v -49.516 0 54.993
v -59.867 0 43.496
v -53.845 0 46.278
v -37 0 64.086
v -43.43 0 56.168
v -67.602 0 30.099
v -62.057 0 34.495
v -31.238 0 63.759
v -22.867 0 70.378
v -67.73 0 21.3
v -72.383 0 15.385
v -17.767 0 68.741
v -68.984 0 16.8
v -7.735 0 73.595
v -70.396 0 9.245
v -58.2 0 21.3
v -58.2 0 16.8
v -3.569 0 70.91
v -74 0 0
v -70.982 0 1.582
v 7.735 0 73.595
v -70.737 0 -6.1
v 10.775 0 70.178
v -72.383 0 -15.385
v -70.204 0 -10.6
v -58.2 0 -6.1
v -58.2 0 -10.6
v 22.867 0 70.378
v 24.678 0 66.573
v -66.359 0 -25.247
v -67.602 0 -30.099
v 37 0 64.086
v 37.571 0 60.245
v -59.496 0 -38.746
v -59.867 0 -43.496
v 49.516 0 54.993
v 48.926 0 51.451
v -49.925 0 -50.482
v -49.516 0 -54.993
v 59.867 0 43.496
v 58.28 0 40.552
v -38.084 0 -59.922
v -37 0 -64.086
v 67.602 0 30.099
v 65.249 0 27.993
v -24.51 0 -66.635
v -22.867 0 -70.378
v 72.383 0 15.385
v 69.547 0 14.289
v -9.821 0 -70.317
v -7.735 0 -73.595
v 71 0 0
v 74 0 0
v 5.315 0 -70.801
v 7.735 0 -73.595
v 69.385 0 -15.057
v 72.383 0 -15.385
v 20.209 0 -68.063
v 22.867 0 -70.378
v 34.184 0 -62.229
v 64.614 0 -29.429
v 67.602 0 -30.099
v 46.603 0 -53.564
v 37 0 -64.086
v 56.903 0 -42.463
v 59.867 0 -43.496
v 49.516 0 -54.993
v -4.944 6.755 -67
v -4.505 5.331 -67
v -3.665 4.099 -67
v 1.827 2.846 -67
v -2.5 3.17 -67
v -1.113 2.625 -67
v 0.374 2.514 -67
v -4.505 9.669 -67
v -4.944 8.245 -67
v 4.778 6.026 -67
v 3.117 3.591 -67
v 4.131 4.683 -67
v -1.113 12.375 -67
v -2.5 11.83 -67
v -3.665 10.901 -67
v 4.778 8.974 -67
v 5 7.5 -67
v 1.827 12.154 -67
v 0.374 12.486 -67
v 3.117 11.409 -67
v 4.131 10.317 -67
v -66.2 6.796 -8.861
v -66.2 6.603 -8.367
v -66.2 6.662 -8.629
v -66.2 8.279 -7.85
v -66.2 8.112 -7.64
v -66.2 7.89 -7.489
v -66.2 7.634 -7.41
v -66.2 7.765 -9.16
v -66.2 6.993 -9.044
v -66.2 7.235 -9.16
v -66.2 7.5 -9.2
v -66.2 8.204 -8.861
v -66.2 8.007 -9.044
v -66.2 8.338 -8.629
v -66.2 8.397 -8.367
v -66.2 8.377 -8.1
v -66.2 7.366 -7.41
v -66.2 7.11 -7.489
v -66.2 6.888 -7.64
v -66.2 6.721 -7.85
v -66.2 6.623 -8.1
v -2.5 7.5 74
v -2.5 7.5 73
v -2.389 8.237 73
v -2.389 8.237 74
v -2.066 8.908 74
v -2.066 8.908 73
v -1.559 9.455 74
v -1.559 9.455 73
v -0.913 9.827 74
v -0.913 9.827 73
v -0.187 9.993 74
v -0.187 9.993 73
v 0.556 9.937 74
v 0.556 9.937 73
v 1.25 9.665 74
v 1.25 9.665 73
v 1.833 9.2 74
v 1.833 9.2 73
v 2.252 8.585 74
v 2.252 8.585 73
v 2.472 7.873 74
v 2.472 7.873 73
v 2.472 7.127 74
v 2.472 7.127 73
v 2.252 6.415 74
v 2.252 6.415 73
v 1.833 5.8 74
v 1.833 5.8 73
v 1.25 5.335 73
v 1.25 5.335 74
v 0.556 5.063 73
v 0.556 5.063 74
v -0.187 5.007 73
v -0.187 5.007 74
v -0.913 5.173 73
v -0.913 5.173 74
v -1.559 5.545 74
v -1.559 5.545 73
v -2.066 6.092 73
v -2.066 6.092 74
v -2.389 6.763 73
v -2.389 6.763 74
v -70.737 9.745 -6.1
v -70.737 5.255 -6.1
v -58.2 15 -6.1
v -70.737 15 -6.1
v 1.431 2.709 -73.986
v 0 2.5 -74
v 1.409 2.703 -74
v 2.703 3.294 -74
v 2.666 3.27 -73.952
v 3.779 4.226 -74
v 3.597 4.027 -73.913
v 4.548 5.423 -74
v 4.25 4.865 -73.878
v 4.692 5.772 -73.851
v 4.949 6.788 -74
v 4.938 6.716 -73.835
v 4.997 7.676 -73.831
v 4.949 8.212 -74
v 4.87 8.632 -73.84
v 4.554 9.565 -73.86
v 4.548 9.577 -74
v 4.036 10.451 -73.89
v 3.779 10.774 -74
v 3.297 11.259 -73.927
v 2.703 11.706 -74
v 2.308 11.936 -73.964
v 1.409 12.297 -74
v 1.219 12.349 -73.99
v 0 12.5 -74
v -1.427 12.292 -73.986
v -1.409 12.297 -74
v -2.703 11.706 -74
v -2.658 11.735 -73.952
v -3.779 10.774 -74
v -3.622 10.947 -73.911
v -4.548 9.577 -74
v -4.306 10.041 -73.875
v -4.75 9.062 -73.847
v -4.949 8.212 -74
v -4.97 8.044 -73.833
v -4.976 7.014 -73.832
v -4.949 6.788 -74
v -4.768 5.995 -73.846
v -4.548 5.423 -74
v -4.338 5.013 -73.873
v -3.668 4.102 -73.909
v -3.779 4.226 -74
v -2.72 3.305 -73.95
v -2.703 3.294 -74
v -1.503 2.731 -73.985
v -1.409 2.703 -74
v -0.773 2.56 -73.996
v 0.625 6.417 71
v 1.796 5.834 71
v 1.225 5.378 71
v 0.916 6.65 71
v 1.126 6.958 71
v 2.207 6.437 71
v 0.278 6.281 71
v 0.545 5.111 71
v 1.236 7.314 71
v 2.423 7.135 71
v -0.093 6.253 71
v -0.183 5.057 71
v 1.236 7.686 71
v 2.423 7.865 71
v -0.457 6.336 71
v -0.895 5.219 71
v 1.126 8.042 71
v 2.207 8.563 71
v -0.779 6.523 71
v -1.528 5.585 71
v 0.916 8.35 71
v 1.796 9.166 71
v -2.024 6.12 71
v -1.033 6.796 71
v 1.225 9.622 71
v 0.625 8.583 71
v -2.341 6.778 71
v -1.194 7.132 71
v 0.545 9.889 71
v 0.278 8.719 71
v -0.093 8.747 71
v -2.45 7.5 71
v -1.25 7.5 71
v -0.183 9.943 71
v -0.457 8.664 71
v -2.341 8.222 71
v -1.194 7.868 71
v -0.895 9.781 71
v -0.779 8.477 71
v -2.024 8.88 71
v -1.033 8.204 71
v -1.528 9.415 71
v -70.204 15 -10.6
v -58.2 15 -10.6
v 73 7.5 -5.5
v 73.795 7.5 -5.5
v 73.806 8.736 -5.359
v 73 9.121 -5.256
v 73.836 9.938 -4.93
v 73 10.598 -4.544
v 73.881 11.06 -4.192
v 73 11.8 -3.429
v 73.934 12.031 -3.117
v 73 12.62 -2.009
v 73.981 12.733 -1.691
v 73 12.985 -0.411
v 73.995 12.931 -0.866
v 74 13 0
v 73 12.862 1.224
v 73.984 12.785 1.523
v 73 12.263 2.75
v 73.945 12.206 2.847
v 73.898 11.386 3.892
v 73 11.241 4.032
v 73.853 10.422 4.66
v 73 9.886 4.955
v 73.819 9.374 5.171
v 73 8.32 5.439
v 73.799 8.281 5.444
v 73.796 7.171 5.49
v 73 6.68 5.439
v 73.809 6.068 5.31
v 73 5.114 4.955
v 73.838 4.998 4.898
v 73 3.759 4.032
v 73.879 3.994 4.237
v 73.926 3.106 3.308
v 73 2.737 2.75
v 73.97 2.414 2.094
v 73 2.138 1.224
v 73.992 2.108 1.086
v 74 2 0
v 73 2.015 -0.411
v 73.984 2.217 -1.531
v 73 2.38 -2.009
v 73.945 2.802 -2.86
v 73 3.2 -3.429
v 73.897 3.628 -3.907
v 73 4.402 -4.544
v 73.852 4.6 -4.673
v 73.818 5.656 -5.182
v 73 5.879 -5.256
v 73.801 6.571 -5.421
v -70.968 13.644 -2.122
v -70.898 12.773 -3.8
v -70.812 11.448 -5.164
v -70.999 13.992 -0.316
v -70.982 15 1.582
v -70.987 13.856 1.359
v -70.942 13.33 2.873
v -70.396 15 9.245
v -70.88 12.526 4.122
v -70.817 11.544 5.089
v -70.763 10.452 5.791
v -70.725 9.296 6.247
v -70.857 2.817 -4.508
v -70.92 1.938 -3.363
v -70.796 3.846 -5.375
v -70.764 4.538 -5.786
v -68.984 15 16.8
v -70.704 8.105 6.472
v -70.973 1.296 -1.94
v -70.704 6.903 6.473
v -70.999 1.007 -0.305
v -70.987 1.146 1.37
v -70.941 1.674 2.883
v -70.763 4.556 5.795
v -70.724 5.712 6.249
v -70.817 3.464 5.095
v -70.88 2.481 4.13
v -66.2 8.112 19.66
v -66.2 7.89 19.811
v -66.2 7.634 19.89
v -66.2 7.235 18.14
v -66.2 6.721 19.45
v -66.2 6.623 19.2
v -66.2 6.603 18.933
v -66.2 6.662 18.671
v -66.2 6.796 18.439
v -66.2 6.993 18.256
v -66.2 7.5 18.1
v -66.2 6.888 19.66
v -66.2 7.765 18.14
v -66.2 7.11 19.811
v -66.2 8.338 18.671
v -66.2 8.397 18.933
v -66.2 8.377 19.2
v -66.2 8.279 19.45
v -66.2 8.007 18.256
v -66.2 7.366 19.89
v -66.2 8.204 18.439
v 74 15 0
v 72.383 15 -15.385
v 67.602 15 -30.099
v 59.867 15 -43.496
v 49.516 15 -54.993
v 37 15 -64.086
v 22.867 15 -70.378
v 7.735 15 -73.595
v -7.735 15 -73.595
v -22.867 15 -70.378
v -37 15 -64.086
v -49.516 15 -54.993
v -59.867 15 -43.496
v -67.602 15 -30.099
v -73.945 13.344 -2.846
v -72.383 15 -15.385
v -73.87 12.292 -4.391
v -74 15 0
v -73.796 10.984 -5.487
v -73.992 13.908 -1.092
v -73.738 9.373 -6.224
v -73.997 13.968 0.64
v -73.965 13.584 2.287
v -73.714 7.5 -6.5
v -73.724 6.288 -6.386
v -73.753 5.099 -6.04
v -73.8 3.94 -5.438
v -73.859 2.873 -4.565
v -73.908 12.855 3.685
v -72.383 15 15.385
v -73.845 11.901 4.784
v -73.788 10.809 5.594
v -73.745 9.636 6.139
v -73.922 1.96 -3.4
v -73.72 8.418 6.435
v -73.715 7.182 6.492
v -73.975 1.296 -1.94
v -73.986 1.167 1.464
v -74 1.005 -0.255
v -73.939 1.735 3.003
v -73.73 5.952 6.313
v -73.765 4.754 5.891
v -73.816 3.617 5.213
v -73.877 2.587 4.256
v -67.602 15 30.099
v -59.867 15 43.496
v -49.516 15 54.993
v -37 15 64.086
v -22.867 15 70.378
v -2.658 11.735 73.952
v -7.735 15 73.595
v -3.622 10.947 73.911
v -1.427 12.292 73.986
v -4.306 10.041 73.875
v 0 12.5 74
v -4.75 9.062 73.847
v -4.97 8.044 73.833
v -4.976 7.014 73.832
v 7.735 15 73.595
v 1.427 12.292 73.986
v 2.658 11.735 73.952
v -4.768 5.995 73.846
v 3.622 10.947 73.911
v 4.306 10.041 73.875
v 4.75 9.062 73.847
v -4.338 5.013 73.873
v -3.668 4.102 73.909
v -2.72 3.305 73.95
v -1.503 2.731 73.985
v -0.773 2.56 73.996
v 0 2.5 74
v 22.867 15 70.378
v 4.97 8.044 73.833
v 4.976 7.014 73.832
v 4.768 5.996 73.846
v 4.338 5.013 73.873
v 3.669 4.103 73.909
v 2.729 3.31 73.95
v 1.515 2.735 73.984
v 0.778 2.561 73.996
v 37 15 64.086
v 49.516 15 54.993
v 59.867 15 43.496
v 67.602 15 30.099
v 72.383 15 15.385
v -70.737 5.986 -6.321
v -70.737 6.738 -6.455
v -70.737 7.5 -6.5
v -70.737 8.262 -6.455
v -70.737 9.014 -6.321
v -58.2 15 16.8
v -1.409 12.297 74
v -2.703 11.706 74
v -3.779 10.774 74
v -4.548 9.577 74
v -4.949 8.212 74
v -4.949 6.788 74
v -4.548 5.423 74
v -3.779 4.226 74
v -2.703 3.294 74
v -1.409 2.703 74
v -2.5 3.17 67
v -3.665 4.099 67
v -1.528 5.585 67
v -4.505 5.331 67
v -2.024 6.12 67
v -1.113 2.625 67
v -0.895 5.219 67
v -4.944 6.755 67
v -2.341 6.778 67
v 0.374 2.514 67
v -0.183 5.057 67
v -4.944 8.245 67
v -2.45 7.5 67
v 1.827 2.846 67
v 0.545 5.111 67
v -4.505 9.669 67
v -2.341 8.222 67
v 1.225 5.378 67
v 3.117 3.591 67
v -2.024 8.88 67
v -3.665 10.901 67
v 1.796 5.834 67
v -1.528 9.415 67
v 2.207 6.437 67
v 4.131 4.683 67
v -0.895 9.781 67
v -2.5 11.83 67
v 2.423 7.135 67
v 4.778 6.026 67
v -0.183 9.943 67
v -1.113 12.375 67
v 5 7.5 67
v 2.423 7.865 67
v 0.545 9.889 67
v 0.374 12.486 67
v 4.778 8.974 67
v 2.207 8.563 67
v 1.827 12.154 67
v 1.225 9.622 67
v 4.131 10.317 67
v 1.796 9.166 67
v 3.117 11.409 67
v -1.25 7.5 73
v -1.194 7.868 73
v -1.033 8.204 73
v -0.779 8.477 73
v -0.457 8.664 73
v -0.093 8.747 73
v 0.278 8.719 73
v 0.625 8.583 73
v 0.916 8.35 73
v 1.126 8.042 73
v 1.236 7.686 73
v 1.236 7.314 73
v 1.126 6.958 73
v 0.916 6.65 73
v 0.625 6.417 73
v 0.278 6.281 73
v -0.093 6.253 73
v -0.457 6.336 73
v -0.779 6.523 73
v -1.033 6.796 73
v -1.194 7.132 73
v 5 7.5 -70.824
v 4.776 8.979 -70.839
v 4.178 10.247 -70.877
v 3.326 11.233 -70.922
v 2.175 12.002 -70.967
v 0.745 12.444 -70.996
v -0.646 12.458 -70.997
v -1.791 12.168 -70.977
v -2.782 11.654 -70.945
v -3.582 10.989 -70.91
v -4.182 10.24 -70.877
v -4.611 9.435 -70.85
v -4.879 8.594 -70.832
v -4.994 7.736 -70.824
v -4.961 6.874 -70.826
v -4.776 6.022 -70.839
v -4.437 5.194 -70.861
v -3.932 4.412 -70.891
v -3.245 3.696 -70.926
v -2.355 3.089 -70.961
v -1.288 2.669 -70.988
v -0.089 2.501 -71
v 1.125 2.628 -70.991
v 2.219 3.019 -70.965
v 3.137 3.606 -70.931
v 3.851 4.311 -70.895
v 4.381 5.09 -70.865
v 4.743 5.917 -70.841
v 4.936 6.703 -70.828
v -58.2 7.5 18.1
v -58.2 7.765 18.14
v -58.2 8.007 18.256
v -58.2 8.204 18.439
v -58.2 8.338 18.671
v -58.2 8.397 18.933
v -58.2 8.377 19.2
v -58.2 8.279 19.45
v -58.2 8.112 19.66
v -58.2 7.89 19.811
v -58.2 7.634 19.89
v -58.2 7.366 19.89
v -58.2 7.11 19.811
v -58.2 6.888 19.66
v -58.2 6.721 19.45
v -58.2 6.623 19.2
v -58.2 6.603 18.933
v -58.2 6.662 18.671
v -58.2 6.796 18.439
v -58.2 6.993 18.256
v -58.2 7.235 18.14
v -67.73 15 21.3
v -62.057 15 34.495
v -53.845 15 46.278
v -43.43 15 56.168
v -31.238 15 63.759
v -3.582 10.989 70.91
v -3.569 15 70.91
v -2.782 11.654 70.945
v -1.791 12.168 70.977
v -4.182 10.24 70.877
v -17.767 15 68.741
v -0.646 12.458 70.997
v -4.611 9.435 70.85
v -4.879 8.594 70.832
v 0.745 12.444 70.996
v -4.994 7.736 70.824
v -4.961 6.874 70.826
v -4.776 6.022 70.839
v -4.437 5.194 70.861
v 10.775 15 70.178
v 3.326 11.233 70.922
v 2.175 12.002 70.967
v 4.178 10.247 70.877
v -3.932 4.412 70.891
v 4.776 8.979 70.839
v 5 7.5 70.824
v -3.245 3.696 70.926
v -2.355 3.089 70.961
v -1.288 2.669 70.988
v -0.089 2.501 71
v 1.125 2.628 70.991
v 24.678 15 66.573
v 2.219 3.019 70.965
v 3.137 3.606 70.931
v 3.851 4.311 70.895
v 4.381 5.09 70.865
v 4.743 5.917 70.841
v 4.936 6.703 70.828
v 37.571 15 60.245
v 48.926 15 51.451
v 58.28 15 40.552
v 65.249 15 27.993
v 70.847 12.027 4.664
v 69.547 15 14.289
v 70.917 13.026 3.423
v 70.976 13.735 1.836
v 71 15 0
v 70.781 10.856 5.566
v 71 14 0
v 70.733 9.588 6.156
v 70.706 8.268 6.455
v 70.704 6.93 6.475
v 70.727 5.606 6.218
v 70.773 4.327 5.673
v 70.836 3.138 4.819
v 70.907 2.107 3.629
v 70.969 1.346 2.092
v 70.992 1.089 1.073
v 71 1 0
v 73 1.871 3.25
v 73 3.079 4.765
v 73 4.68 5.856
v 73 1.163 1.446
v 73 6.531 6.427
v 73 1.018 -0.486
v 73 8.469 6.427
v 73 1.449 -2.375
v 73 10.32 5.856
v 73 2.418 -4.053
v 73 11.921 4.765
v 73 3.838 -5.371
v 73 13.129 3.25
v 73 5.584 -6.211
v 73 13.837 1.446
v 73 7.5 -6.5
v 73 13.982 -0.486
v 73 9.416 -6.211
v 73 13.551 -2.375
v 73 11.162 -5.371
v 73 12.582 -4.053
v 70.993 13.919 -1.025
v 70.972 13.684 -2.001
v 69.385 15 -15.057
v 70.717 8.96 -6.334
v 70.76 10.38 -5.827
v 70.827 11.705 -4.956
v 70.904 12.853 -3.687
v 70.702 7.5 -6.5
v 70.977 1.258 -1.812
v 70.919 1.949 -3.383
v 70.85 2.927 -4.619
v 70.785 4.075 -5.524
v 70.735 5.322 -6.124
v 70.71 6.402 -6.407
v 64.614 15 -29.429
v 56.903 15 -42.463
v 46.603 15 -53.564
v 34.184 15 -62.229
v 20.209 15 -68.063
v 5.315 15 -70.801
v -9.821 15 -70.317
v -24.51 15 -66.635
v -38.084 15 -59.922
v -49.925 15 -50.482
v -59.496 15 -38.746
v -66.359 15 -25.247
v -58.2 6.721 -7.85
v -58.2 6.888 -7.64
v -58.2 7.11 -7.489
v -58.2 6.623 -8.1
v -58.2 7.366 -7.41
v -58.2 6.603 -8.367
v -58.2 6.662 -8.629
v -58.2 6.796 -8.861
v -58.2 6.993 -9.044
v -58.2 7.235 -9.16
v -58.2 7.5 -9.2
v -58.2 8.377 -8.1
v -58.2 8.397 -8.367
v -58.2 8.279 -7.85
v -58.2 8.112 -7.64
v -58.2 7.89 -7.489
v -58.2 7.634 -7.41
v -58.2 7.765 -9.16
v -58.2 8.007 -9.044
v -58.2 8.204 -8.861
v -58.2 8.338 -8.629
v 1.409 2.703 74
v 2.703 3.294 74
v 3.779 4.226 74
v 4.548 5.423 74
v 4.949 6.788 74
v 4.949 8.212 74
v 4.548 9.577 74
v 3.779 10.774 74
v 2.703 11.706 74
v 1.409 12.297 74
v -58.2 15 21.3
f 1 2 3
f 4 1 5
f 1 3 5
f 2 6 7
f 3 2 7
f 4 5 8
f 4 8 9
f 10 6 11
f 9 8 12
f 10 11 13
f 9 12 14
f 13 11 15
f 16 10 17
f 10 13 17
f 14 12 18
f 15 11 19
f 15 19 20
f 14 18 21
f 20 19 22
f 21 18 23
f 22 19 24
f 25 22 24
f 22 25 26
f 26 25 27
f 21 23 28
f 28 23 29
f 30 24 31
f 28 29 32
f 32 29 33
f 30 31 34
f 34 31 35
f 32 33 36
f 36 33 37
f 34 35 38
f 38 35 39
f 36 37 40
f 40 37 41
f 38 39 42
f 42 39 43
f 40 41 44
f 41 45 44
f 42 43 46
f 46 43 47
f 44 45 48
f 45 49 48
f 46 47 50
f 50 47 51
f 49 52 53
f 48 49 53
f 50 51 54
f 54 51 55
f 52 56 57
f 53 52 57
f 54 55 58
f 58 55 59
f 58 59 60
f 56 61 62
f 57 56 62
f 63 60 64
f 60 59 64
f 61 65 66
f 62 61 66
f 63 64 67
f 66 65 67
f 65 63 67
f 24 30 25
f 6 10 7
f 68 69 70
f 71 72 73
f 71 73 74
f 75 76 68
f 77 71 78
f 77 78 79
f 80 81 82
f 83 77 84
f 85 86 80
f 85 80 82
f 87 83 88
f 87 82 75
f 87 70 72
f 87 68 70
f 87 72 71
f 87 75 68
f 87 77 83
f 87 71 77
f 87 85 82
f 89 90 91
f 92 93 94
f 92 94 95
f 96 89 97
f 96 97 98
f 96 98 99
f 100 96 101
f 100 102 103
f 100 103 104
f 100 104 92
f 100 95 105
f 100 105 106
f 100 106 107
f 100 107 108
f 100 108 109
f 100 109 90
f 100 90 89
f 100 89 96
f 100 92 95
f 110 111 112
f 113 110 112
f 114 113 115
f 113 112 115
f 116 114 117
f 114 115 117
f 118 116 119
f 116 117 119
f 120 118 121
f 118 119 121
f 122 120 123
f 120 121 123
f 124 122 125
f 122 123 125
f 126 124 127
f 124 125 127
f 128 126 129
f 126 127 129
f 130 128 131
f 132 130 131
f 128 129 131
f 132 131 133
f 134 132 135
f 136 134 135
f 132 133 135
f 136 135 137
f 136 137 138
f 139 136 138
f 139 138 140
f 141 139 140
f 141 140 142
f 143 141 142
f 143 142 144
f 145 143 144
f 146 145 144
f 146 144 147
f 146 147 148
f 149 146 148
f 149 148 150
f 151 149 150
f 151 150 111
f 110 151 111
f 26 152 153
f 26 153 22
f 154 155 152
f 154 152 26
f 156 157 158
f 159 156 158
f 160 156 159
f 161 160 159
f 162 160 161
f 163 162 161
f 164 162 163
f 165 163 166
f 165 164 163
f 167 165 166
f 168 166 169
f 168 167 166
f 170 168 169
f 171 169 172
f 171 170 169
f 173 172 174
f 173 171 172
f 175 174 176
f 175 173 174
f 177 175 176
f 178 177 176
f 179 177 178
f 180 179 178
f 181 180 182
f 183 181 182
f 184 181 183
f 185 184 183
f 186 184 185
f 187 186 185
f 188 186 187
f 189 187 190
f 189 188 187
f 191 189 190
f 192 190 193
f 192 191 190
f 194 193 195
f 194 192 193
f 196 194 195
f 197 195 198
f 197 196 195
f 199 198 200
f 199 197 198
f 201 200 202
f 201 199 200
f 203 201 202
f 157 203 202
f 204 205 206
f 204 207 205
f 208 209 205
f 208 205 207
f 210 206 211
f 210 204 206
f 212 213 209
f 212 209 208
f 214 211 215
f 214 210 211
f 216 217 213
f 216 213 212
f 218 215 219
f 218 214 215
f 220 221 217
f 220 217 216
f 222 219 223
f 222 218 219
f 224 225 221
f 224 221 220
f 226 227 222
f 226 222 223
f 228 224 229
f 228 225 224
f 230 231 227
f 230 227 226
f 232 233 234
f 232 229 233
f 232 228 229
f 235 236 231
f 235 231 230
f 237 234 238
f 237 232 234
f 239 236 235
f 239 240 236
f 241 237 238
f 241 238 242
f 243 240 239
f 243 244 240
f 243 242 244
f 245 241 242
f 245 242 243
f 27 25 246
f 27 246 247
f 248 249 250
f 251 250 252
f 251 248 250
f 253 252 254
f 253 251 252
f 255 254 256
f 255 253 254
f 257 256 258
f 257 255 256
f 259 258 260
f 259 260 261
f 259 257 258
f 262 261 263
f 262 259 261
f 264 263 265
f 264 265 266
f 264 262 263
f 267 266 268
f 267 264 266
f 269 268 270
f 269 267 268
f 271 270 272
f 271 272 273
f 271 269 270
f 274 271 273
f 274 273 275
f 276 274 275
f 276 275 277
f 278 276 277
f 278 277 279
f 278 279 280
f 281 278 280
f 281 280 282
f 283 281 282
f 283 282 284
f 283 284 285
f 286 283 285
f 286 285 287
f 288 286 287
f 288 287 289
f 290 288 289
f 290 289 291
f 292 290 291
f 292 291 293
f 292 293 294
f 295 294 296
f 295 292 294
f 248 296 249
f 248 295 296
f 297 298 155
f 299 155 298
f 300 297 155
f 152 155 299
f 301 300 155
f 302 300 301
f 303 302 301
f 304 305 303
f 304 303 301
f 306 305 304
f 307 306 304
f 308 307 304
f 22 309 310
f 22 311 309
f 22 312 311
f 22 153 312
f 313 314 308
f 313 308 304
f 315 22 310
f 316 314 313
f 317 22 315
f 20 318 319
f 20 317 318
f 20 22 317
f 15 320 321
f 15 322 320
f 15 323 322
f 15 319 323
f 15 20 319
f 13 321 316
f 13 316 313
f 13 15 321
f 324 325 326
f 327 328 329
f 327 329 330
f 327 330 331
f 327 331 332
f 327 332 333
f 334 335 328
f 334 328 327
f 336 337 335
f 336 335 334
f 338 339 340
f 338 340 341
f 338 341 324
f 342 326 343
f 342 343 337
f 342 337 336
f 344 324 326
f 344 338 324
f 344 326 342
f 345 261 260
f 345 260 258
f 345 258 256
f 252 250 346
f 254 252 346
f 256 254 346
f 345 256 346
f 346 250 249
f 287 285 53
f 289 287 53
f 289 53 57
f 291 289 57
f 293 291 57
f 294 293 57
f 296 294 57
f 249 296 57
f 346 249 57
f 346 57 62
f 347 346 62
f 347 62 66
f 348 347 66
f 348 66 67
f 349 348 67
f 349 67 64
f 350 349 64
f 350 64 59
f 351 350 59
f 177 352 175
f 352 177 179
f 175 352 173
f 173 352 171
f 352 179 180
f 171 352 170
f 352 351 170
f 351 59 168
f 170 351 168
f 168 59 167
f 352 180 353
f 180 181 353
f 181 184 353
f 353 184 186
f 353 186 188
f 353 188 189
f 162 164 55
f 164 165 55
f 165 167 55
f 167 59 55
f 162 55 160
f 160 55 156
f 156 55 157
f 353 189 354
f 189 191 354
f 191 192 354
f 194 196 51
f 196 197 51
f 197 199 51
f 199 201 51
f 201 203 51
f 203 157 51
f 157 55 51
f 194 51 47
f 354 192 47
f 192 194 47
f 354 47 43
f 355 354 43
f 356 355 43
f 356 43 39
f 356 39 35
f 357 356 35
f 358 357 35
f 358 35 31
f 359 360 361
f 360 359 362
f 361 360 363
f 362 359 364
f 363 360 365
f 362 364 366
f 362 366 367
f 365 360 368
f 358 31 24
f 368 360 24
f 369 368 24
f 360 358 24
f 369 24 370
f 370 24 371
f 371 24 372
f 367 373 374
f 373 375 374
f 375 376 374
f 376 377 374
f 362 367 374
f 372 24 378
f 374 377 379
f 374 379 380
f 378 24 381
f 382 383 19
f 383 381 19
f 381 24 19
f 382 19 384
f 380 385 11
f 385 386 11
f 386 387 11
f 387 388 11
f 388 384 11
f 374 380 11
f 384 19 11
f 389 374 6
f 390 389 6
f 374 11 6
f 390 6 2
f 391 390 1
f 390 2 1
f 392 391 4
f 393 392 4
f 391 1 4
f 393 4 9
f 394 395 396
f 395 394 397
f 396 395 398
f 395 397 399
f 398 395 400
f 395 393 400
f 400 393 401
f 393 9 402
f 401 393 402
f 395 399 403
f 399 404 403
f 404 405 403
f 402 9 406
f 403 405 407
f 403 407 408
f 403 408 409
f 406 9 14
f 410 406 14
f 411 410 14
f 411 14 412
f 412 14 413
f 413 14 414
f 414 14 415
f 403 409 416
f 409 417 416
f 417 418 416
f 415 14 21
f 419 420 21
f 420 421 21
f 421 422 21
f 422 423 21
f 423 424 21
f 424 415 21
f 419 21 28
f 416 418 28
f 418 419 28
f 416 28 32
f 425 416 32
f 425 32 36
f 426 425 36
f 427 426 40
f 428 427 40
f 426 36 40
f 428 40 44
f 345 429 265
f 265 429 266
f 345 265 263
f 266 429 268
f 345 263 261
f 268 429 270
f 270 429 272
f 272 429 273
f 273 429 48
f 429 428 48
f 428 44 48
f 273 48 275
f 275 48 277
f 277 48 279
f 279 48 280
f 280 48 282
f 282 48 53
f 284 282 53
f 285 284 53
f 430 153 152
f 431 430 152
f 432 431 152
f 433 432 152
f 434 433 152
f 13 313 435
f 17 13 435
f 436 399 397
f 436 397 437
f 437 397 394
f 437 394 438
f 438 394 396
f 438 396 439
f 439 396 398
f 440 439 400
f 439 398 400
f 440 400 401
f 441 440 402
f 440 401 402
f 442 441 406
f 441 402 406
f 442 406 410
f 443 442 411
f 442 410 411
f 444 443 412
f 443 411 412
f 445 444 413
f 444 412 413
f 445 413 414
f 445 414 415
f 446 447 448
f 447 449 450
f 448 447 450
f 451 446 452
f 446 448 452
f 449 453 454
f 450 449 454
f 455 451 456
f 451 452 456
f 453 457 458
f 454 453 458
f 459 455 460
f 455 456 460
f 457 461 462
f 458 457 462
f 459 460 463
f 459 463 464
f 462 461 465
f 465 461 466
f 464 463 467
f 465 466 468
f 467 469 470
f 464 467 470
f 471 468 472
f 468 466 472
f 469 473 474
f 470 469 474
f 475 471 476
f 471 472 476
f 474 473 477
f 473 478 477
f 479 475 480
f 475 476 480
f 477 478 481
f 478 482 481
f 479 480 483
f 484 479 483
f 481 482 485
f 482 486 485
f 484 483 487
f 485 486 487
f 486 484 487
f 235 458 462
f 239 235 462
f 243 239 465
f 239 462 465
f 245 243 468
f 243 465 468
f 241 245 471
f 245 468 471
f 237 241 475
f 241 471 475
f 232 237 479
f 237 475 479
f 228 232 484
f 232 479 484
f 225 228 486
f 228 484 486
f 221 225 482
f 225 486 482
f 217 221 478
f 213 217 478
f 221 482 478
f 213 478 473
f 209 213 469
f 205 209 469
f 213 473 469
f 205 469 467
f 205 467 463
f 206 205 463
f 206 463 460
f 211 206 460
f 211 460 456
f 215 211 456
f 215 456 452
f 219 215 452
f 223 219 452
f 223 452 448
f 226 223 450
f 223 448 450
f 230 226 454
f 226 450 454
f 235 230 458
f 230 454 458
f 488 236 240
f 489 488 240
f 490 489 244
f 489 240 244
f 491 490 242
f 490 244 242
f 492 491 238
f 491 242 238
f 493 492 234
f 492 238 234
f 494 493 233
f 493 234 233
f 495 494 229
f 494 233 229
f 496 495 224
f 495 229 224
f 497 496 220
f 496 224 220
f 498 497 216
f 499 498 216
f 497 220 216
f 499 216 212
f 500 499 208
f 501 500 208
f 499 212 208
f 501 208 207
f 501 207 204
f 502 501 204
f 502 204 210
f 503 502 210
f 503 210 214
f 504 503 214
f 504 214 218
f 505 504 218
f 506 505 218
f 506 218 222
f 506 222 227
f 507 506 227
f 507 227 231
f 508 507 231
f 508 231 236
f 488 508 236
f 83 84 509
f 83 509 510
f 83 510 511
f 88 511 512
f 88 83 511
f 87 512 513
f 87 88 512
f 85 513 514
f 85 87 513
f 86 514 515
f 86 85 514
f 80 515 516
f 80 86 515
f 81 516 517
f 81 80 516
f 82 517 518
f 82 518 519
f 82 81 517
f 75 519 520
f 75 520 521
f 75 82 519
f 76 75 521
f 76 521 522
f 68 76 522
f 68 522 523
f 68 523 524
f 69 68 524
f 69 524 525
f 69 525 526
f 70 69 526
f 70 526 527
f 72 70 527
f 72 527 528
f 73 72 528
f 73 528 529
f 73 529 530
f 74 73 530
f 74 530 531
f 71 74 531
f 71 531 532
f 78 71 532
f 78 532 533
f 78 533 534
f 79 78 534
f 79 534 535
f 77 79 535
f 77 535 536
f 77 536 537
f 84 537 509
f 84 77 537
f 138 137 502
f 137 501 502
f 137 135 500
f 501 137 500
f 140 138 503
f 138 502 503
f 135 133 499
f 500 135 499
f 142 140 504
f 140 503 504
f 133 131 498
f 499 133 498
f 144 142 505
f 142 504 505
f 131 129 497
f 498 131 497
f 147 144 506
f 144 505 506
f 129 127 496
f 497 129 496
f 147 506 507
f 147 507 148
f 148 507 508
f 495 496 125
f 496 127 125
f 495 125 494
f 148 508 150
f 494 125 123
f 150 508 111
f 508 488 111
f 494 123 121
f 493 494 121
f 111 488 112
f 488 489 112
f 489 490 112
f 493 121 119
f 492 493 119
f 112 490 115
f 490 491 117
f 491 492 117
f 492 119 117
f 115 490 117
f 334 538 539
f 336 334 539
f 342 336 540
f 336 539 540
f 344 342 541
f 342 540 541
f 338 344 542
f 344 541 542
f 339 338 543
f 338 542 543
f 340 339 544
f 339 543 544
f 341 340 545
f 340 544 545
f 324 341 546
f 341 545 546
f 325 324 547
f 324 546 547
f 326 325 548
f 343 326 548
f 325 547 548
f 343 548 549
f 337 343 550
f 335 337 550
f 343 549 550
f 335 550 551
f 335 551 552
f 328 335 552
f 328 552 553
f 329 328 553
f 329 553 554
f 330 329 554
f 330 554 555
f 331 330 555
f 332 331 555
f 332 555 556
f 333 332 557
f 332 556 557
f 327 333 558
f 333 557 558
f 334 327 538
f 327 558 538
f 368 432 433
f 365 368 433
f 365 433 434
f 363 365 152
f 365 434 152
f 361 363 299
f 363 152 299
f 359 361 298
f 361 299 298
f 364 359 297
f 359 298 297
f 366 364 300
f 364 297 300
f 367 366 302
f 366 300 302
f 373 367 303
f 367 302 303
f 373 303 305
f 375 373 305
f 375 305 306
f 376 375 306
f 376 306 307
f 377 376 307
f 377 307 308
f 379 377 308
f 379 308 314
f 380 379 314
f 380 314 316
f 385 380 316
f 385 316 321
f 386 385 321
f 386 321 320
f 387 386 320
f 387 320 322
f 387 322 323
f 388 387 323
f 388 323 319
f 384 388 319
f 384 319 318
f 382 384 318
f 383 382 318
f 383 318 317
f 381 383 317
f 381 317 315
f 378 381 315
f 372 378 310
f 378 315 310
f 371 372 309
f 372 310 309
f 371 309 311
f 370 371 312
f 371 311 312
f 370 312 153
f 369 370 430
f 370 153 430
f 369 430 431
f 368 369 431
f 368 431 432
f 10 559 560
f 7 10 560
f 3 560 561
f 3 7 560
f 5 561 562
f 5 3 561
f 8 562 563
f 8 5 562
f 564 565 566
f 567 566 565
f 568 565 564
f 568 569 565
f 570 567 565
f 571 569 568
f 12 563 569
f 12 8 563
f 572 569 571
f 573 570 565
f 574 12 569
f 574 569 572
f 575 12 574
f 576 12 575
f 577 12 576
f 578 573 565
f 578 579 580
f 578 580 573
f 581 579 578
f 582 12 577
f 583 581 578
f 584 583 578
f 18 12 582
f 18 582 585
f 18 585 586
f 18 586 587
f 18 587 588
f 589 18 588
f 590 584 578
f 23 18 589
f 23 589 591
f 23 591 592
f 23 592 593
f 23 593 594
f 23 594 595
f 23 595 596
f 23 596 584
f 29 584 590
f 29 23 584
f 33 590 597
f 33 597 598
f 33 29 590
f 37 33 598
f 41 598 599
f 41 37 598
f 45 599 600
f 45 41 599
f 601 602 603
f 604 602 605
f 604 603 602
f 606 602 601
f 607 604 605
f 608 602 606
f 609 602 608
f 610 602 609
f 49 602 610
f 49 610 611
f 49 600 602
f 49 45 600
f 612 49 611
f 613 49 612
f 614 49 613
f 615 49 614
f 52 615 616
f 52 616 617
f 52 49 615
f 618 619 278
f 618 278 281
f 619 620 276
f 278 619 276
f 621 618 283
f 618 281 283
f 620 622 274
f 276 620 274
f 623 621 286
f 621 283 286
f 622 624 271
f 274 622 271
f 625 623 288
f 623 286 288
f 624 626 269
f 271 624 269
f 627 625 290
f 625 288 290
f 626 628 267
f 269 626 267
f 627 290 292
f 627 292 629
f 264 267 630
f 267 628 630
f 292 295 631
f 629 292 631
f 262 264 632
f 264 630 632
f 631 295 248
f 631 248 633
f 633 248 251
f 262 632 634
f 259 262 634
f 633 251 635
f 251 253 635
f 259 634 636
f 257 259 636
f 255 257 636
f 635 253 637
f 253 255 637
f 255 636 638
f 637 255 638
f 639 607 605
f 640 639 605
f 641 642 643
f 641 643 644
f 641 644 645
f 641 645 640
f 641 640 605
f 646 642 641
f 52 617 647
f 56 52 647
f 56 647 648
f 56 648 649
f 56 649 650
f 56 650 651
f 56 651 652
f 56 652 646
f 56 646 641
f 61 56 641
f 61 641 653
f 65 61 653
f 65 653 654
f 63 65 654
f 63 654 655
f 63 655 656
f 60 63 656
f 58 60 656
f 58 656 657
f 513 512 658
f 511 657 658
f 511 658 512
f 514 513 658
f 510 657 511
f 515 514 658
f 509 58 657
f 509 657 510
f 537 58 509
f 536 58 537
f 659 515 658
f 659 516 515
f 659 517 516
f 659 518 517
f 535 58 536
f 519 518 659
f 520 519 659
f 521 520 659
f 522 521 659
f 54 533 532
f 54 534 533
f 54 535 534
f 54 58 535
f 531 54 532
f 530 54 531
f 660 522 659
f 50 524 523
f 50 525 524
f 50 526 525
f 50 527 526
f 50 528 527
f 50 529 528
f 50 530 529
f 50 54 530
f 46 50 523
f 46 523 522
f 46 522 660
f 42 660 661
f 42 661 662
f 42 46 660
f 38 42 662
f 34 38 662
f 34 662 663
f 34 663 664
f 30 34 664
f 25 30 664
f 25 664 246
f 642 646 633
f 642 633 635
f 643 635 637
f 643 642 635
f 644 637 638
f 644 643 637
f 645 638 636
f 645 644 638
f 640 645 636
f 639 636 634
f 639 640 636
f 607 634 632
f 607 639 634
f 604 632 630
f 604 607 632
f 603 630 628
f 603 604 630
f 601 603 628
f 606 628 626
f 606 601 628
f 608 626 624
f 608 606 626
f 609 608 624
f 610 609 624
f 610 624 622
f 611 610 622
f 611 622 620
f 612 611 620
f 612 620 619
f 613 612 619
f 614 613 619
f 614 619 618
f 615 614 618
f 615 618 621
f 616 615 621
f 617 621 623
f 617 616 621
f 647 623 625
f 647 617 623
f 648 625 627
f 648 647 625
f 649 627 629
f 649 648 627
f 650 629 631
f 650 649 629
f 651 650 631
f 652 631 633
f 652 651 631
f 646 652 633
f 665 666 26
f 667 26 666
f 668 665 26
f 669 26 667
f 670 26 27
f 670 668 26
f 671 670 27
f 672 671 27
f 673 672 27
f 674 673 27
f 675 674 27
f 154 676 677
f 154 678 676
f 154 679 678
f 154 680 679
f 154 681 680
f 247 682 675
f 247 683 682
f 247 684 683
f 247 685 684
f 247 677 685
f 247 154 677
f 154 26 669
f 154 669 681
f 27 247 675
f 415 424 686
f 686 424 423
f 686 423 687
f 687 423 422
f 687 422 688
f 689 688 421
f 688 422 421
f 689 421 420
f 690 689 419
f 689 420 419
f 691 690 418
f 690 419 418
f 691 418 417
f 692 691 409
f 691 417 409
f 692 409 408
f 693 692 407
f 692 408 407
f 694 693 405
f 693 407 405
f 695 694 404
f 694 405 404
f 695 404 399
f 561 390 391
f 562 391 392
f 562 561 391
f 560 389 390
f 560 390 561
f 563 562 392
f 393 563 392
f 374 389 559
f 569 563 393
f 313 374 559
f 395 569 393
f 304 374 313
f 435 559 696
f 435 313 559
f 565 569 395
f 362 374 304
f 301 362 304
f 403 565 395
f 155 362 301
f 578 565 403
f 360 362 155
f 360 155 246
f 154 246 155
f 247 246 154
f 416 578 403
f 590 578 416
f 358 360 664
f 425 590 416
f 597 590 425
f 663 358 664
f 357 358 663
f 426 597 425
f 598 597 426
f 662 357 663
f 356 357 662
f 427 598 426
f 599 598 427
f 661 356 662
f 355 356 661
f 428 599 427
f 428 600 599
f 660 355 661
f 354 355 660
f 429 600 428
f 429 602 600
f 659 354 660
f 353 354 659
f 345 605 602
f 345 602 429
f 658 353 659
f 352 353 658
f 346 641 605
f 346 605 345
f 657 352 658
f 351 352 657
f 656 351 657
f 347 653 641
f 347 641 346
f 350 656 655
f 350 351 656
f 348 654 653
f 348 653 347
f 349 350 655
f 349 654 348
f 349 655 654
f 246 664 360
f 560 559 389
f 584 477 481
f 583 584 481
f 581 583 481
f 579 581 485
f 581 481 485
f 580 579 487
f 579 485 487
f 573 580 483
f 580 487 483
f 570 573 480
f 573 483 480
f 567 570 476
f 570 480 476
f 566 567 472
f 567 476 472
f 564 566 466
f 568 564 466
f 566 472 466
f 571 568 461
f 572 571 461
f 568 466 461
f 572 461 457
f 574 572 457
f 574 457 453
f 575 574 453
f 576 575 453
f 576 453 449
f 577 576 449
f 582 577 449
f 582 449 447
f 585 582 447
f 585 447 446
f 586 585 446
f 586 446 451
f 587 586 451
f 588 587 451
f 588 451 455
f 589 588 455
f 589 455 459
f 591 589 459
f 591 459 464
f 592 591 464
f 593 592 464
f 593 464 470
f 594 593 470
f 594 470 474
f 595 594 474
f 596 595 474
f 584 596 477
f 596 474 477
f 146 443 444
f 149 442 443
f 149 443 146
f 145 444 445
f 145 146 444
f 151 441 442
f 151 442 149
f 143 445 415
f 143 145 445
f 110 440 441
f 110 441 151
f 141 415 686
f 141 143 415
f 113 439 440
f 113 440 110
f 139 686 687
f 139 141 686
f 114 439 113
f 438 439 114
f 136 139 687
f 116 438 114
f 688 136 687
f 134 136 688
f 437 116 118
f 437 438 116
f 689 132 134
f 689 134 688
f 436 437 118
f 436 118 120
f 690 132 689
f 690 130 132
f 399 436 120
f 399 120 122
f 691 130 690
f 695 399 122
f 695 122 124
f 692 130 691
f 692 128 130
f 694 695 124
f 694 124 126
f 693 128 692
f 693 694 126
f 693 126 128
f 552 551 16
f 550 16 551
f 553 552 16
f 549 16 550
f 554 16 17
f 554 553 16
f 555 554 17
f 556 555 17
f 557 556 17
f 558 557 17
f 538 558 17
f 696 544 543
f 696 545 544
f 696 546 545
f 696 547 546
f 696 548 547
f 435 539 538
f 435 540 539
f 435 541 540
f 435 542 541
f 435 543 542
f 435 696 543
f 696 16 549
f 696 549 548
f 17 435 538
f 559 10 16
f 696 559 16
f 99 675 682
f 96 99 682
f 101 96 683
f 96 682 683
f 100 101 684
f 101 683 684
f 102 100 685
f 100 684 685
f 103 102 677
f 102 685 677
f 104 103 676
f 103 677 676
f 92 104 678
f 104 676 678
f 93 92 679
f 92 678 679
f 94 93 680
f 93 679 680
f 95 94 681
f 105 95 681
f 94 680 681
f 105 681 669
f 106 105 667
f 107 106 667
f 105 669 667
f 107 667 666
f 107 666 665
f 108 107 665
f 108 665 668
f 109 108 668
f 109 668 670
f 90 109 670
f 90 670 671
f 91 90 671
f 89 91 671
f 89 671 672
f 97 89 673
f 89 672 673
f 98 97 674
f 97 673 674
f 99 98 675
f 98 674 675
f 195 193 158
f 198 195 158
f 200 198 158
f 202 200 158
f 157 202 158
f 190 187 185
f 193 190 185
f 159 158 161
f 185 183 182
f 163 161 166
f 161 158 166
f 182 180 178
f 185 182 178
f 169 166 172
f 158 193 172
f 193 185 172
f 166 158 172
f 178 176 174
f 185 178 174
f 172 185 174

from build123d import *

# Parameters (mm, degrees)
SKETCH1_R               = 74
SKETCH1_R_2             = 71
BOSS_EXTRUDE1_DEPTH     = 15
SKETCH2_R               = 6.5
CUT_EXTRUDE1_DEPTH      = 73
CUT_EXTRUDE1_DEPTH_BACK = 75
SKETCH9_R               = 5.5
CUT_EXTRUDE6_DEPTH      = 75.0000001
BOSS_EXTRUDE2_START     = -6
SKETCH3_R               = 5
BOSS_EXTRUDE2_DEPTH     = 7
SKETCH4_W               = 10.783766206
SKETCH4_H               = 4.5
SKETCH4_W_2             = 12.537472389
BOSS_EXTRUDE3_DEPTH     = 15
SKETCH5_R               = 0.9
CUT_EXTRUDE2_DEPTH      = 8
SKETCH6_R               = 2.45
CUT_EXTRUDE3_DEPTH      = 4
SKETCH7_R               = 1.25
CUT_EXTRUDE4_DEPTH      = 4
SKETCH8_R               = 2.5
CUT_EXTRUDE5_DEPTH      = 4


with BuildPart() as part:
    # Sketch1 → Boss-Extrude1 (new body)
    with BuildSketch(Plane(origin=(0, 0, 0), x_dir=(1, 0, 0), z_dir=(0, 1, 0))):
        Circle(SKETCH1_R)
        Circle(SKETCH1_R_2, mode=Mode.SUBTRACT)
    extrude(amount=BOSS_EXTRUDE1_DEPTH)

    # Sketch2 → Cut-Extrude1 (cut, two sides)
    with BuildSketch(Plane(origin=(0, 0, 0), x_dir=(0, 0, -1), z_dir=(1, 0, 0))) as cut_extrude1_sk:
        with Locations((0, 7.5)):
            Circle(SKETCH2_R)
    extrude(amount=CUT_EXTRUDE1_DEPTH, mode=Mode.SUBTRACT)
    extrude(cut_extrude1_sk.sketch, amount=-CUT_EXTRUDE1_DEPTH_BACK, mode=Mode.SUBTRACT)

    # Sketch9 → Cut-Extrude6 (cut, through all)
    with BuildSketch(Plane(origin=(0, 0, 0), x_dir=(0, 0, -1), z_dir=(1, 0, 0))):
        with Locations((0, 7.5)):
            Circle(SKETCH9_R)
    extrude(amount=CUT_EXTRUDE6_DEPTH, mode=Mode.SUBTRACT)

    # Sketch3 → Boss-Extrude2 (add)
    with BuildSketch(Plane.XY.offset(73).offset(BOSS_EXTRUDE2_START)):
        with Locations((0, 7.5)):
            Circle(SKETCH3_R)
    boss_extrude2 = extrude(amount=BOSS_EXTRUDE2_DEPTH)

    # Mirror1: Boss-Extrude2 across plane
    add(boss_extrude2.mirror(Plane.XY))

    # Sketch4 → Boss-Extrude3 (add)
    with BuildSketch(Plane(origin=(0, 15, 0), x_dir=(1, 0, 0), z_dir=(0, 1, 0))):
        with Locations((-63.591883103, -19.05)):
            Rectangle(SKETCH4_W, SKETCH4_H)
        with Locations((-64.468736194, 8.35)):
            Rectangle(SKETCH4_W_2, SKETCH4_H)
    extrude(amount=-BOSS_EXTRUDE3_DEPTH)

    # Sketch5 → Cut-Extrude2 (cut)
    with BuildSketch(Plane(origin=(-58.2, 0, 0), x_dir=(0, 0, -1), z_dir=(1, 0, 0))):
        with Locations((8.3, 7.5)):
            Circle(SKETCH5_R)
        with Locations((-19, 7.5)):
            Circle(SKETCH5_R)
    extrude(amount=-CUT_EXTRUDE2_DEPTH, mode=Mode.SUBTRACT)

    # Sketch6 → Cut-Extrude3 (cut)
    with BuildSketch(Plane(origin=(0, 0, 67), x_dir=(-1, 0, 0), z_dir=(0, 0, -1))):
        with Locations((0, 7.5)):
            Circle(SKETCH6_R)
    extrude(amount=-CUT_EXTRUDE3_DEPTH, mode=Mode.SUBTRACT)

    # Sketch7 → Cut-Extrude4 (cut)
    with BuildSketch(Plane(origin=(0, 0, 71), x_dir=(-1, 0, 0), z_dir=(0, 0, -1))):
        with Locations((0, 7.5)):
            Circle(SKETCH7_R)
    extrude(amount=-CUT_EXTRUDE4_DEPTH, mode=Mode.SUBTRACT)

    # Sketch8 → Cut-Extrude5 (cut)
    with BuildSketch(Plane(origin=(0, 0, 73), x_dir=(-1, 0, 0), z_dir=(0, 0, -1))):
        with Locations((0, 7.5)):
            Circle(SKETCH8_R)
    extrude(amount=-CUT_EXTRUDE5_DEPTH, mode=Mode.SUBTRACT)


solid = part.part
